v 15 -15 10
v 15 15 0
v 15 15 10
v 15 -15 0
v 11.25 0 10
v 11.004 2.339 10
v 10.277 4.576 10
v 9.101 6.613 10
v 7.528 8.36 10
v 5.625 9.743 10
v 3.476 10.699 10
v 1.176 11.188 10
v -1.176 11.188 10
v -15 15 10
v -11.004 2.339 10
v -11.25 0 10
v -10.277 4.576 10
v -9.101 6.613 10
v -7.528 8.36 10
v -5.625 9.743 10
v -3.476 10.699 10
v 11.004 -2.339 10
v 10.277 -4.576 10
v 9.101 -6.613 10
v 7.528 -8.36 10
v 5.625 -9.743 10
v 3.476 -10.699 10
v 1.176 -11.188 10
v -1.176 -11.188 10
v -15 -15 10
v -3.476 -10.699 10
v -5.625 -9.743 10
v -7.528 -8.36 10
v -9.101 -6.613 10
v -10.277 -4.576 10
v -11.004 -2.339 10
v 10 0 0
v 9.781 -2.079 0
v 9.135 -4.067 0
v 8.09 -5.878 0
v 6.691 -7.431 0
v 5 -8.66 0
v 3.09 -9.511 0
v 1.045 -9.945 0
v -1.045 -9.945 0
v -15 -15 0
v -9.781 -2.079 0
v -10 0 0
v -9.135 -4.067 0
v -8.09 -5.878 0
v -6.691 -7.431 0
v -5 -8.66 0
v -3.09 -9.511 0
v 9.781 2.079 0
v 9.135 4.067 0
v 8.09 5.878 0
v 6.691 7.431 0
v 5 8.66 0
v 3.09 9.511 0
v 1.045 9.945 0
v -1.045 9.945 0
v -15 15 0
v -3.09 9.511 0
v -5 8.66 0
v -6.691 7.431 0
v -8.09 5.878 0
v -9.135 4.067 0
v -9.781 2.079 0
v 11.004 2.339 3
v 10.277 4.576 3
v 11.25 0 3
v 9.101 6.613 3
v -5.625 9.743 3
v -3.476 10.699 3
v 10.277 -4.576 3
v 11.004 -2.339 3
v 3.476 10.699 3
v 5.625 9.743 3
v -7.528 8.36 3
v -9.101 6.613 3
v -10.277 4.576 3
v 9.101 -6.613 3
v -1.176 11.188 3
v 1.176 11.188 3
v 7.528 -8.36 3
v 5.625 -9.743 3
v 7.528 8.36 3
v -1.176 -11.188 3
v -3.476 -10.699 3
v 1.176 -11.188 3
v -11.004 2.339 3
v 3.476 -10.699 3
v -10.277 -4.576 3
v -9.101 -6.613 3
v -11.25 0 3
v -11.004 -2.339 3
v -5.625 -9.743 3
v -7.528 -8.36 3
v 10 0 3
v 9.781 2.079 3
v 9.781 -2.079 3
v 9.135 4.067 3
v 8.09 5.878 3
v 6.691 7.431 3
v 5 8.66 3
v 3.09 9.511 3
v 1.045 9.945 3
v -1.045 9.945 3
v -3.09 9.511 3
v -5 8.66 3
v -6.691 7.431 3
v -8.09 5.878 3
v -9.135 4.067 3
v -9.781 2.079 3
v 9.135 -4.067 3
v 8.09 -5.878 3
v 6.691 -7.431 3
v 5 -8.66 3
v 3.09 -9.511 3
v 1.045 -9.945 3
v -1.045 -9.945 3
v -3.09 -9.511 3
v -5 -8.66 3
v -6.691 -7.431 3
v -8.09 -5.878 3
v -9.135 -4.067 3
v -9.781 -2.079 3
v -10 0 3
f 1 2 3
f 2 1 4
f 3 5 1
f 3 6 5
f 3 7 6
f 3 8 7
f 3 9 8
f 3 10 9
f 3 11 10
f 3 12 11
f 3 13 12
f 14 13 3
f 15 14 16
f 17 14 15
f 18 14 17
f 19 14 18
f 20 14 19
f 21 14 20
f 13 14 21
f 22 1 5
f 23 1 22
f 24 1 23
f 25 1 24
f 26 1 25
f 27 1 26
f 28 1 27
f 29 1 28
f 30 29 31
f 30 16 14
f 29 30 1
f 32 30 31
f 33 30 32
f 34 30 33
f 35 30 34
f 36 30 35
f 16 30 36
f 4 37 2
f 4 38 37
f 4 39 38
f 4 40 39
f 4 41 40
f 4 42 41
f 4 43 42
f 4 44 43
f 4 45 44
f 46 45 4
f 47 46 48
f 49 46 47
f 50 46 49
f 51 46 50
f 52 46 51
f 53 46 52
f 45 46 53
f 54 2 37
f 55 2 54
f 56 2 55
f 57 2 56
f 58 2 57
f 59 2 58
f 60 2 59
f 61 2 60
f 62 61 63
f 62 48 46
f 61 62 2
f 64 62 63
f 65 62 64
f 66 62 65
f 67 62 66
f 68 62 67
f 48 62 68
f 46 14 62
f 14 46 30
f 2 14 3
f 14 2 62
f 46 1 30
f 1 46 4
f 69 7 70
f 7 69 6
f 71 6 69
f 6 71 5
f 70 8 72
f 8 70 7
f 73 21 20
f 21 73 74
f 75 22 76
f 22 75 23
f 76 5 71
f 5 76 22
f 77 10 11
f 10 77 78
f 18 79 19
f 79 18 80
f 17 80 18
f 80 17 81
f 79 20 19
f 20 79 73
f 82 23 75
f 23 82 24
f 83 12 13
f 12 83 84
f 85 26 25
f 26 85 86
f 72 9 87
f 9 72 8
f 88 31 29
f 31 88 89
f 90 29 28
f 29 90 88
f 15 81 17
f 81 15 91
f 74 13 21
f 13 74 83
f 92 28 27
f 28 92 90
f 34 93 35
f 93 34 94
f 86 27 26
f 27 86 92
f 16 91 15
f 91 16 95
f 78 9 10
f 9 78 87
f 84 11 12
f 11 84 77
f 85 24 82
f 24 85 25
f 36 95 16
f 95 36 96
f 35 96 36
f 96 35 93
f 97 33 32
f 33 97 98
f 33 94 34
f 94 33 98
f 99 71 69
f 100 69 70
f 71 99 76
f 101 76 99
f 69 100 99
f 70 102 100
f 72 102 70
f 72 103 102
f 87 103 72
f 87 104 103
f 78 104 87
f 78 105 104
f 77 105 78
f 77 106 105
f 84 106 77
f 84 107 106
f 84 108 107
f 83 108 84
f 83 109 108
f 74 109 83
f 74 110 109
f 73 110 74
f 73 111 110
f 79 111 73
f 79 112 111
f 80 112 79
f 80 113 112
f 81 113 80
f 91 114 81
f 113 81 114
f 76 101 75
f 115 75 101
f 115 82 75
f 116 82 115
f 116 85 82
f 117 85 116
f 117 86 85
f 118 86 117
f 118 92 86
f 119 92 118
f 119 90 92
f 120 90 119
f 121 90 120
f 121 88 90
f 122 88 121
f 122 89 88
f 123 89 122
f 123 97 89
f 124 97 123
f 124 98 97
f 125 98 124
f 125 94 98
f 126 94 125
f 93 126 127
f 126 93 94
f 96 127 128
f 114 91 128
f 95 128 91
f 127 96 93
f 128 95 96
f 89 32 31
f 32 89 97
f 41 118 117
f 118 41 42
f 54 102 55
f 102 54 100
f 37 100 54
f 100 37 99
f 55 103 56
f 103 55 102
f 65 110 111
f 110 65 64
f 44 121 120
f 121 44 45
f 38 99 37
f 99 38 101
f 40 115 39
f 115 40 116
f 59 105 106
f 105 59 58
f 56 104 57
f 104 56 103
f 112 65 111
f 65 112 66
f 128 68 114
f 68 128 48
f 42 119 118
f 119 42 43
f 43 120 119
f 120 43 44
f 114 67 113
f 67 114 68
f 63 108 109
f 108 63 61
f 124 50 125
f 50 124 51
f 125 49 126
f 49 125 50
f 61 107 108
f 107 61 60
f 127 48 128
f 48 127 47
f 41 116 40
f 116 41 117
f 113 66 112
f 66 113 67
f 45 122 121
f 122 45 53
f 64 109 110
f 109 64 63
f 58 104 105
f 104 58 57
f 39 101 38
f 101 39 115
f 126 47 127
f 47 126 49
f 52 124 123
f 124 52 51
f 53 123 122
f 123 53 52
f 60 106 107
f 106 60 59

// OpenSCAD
// test part to work out kinks of mounting 608 bearings
// 608 bearing
// OD = 22mm
// ID = 8mm
// Height = 7mm
//
difference(){

	// box to hold the bearing
	translate([-(30/2),-(30/2),0]){
		cube([30,30,10]);
	}

	// opening to hold bearing stator
	translate([0,0,3]){
		cylinder(r=(22.5/2), h=8);
	}

	// opening for bearing rotor
	translate([0,0,-1]){
		cylinder(r=10, h=9);
	}
}
